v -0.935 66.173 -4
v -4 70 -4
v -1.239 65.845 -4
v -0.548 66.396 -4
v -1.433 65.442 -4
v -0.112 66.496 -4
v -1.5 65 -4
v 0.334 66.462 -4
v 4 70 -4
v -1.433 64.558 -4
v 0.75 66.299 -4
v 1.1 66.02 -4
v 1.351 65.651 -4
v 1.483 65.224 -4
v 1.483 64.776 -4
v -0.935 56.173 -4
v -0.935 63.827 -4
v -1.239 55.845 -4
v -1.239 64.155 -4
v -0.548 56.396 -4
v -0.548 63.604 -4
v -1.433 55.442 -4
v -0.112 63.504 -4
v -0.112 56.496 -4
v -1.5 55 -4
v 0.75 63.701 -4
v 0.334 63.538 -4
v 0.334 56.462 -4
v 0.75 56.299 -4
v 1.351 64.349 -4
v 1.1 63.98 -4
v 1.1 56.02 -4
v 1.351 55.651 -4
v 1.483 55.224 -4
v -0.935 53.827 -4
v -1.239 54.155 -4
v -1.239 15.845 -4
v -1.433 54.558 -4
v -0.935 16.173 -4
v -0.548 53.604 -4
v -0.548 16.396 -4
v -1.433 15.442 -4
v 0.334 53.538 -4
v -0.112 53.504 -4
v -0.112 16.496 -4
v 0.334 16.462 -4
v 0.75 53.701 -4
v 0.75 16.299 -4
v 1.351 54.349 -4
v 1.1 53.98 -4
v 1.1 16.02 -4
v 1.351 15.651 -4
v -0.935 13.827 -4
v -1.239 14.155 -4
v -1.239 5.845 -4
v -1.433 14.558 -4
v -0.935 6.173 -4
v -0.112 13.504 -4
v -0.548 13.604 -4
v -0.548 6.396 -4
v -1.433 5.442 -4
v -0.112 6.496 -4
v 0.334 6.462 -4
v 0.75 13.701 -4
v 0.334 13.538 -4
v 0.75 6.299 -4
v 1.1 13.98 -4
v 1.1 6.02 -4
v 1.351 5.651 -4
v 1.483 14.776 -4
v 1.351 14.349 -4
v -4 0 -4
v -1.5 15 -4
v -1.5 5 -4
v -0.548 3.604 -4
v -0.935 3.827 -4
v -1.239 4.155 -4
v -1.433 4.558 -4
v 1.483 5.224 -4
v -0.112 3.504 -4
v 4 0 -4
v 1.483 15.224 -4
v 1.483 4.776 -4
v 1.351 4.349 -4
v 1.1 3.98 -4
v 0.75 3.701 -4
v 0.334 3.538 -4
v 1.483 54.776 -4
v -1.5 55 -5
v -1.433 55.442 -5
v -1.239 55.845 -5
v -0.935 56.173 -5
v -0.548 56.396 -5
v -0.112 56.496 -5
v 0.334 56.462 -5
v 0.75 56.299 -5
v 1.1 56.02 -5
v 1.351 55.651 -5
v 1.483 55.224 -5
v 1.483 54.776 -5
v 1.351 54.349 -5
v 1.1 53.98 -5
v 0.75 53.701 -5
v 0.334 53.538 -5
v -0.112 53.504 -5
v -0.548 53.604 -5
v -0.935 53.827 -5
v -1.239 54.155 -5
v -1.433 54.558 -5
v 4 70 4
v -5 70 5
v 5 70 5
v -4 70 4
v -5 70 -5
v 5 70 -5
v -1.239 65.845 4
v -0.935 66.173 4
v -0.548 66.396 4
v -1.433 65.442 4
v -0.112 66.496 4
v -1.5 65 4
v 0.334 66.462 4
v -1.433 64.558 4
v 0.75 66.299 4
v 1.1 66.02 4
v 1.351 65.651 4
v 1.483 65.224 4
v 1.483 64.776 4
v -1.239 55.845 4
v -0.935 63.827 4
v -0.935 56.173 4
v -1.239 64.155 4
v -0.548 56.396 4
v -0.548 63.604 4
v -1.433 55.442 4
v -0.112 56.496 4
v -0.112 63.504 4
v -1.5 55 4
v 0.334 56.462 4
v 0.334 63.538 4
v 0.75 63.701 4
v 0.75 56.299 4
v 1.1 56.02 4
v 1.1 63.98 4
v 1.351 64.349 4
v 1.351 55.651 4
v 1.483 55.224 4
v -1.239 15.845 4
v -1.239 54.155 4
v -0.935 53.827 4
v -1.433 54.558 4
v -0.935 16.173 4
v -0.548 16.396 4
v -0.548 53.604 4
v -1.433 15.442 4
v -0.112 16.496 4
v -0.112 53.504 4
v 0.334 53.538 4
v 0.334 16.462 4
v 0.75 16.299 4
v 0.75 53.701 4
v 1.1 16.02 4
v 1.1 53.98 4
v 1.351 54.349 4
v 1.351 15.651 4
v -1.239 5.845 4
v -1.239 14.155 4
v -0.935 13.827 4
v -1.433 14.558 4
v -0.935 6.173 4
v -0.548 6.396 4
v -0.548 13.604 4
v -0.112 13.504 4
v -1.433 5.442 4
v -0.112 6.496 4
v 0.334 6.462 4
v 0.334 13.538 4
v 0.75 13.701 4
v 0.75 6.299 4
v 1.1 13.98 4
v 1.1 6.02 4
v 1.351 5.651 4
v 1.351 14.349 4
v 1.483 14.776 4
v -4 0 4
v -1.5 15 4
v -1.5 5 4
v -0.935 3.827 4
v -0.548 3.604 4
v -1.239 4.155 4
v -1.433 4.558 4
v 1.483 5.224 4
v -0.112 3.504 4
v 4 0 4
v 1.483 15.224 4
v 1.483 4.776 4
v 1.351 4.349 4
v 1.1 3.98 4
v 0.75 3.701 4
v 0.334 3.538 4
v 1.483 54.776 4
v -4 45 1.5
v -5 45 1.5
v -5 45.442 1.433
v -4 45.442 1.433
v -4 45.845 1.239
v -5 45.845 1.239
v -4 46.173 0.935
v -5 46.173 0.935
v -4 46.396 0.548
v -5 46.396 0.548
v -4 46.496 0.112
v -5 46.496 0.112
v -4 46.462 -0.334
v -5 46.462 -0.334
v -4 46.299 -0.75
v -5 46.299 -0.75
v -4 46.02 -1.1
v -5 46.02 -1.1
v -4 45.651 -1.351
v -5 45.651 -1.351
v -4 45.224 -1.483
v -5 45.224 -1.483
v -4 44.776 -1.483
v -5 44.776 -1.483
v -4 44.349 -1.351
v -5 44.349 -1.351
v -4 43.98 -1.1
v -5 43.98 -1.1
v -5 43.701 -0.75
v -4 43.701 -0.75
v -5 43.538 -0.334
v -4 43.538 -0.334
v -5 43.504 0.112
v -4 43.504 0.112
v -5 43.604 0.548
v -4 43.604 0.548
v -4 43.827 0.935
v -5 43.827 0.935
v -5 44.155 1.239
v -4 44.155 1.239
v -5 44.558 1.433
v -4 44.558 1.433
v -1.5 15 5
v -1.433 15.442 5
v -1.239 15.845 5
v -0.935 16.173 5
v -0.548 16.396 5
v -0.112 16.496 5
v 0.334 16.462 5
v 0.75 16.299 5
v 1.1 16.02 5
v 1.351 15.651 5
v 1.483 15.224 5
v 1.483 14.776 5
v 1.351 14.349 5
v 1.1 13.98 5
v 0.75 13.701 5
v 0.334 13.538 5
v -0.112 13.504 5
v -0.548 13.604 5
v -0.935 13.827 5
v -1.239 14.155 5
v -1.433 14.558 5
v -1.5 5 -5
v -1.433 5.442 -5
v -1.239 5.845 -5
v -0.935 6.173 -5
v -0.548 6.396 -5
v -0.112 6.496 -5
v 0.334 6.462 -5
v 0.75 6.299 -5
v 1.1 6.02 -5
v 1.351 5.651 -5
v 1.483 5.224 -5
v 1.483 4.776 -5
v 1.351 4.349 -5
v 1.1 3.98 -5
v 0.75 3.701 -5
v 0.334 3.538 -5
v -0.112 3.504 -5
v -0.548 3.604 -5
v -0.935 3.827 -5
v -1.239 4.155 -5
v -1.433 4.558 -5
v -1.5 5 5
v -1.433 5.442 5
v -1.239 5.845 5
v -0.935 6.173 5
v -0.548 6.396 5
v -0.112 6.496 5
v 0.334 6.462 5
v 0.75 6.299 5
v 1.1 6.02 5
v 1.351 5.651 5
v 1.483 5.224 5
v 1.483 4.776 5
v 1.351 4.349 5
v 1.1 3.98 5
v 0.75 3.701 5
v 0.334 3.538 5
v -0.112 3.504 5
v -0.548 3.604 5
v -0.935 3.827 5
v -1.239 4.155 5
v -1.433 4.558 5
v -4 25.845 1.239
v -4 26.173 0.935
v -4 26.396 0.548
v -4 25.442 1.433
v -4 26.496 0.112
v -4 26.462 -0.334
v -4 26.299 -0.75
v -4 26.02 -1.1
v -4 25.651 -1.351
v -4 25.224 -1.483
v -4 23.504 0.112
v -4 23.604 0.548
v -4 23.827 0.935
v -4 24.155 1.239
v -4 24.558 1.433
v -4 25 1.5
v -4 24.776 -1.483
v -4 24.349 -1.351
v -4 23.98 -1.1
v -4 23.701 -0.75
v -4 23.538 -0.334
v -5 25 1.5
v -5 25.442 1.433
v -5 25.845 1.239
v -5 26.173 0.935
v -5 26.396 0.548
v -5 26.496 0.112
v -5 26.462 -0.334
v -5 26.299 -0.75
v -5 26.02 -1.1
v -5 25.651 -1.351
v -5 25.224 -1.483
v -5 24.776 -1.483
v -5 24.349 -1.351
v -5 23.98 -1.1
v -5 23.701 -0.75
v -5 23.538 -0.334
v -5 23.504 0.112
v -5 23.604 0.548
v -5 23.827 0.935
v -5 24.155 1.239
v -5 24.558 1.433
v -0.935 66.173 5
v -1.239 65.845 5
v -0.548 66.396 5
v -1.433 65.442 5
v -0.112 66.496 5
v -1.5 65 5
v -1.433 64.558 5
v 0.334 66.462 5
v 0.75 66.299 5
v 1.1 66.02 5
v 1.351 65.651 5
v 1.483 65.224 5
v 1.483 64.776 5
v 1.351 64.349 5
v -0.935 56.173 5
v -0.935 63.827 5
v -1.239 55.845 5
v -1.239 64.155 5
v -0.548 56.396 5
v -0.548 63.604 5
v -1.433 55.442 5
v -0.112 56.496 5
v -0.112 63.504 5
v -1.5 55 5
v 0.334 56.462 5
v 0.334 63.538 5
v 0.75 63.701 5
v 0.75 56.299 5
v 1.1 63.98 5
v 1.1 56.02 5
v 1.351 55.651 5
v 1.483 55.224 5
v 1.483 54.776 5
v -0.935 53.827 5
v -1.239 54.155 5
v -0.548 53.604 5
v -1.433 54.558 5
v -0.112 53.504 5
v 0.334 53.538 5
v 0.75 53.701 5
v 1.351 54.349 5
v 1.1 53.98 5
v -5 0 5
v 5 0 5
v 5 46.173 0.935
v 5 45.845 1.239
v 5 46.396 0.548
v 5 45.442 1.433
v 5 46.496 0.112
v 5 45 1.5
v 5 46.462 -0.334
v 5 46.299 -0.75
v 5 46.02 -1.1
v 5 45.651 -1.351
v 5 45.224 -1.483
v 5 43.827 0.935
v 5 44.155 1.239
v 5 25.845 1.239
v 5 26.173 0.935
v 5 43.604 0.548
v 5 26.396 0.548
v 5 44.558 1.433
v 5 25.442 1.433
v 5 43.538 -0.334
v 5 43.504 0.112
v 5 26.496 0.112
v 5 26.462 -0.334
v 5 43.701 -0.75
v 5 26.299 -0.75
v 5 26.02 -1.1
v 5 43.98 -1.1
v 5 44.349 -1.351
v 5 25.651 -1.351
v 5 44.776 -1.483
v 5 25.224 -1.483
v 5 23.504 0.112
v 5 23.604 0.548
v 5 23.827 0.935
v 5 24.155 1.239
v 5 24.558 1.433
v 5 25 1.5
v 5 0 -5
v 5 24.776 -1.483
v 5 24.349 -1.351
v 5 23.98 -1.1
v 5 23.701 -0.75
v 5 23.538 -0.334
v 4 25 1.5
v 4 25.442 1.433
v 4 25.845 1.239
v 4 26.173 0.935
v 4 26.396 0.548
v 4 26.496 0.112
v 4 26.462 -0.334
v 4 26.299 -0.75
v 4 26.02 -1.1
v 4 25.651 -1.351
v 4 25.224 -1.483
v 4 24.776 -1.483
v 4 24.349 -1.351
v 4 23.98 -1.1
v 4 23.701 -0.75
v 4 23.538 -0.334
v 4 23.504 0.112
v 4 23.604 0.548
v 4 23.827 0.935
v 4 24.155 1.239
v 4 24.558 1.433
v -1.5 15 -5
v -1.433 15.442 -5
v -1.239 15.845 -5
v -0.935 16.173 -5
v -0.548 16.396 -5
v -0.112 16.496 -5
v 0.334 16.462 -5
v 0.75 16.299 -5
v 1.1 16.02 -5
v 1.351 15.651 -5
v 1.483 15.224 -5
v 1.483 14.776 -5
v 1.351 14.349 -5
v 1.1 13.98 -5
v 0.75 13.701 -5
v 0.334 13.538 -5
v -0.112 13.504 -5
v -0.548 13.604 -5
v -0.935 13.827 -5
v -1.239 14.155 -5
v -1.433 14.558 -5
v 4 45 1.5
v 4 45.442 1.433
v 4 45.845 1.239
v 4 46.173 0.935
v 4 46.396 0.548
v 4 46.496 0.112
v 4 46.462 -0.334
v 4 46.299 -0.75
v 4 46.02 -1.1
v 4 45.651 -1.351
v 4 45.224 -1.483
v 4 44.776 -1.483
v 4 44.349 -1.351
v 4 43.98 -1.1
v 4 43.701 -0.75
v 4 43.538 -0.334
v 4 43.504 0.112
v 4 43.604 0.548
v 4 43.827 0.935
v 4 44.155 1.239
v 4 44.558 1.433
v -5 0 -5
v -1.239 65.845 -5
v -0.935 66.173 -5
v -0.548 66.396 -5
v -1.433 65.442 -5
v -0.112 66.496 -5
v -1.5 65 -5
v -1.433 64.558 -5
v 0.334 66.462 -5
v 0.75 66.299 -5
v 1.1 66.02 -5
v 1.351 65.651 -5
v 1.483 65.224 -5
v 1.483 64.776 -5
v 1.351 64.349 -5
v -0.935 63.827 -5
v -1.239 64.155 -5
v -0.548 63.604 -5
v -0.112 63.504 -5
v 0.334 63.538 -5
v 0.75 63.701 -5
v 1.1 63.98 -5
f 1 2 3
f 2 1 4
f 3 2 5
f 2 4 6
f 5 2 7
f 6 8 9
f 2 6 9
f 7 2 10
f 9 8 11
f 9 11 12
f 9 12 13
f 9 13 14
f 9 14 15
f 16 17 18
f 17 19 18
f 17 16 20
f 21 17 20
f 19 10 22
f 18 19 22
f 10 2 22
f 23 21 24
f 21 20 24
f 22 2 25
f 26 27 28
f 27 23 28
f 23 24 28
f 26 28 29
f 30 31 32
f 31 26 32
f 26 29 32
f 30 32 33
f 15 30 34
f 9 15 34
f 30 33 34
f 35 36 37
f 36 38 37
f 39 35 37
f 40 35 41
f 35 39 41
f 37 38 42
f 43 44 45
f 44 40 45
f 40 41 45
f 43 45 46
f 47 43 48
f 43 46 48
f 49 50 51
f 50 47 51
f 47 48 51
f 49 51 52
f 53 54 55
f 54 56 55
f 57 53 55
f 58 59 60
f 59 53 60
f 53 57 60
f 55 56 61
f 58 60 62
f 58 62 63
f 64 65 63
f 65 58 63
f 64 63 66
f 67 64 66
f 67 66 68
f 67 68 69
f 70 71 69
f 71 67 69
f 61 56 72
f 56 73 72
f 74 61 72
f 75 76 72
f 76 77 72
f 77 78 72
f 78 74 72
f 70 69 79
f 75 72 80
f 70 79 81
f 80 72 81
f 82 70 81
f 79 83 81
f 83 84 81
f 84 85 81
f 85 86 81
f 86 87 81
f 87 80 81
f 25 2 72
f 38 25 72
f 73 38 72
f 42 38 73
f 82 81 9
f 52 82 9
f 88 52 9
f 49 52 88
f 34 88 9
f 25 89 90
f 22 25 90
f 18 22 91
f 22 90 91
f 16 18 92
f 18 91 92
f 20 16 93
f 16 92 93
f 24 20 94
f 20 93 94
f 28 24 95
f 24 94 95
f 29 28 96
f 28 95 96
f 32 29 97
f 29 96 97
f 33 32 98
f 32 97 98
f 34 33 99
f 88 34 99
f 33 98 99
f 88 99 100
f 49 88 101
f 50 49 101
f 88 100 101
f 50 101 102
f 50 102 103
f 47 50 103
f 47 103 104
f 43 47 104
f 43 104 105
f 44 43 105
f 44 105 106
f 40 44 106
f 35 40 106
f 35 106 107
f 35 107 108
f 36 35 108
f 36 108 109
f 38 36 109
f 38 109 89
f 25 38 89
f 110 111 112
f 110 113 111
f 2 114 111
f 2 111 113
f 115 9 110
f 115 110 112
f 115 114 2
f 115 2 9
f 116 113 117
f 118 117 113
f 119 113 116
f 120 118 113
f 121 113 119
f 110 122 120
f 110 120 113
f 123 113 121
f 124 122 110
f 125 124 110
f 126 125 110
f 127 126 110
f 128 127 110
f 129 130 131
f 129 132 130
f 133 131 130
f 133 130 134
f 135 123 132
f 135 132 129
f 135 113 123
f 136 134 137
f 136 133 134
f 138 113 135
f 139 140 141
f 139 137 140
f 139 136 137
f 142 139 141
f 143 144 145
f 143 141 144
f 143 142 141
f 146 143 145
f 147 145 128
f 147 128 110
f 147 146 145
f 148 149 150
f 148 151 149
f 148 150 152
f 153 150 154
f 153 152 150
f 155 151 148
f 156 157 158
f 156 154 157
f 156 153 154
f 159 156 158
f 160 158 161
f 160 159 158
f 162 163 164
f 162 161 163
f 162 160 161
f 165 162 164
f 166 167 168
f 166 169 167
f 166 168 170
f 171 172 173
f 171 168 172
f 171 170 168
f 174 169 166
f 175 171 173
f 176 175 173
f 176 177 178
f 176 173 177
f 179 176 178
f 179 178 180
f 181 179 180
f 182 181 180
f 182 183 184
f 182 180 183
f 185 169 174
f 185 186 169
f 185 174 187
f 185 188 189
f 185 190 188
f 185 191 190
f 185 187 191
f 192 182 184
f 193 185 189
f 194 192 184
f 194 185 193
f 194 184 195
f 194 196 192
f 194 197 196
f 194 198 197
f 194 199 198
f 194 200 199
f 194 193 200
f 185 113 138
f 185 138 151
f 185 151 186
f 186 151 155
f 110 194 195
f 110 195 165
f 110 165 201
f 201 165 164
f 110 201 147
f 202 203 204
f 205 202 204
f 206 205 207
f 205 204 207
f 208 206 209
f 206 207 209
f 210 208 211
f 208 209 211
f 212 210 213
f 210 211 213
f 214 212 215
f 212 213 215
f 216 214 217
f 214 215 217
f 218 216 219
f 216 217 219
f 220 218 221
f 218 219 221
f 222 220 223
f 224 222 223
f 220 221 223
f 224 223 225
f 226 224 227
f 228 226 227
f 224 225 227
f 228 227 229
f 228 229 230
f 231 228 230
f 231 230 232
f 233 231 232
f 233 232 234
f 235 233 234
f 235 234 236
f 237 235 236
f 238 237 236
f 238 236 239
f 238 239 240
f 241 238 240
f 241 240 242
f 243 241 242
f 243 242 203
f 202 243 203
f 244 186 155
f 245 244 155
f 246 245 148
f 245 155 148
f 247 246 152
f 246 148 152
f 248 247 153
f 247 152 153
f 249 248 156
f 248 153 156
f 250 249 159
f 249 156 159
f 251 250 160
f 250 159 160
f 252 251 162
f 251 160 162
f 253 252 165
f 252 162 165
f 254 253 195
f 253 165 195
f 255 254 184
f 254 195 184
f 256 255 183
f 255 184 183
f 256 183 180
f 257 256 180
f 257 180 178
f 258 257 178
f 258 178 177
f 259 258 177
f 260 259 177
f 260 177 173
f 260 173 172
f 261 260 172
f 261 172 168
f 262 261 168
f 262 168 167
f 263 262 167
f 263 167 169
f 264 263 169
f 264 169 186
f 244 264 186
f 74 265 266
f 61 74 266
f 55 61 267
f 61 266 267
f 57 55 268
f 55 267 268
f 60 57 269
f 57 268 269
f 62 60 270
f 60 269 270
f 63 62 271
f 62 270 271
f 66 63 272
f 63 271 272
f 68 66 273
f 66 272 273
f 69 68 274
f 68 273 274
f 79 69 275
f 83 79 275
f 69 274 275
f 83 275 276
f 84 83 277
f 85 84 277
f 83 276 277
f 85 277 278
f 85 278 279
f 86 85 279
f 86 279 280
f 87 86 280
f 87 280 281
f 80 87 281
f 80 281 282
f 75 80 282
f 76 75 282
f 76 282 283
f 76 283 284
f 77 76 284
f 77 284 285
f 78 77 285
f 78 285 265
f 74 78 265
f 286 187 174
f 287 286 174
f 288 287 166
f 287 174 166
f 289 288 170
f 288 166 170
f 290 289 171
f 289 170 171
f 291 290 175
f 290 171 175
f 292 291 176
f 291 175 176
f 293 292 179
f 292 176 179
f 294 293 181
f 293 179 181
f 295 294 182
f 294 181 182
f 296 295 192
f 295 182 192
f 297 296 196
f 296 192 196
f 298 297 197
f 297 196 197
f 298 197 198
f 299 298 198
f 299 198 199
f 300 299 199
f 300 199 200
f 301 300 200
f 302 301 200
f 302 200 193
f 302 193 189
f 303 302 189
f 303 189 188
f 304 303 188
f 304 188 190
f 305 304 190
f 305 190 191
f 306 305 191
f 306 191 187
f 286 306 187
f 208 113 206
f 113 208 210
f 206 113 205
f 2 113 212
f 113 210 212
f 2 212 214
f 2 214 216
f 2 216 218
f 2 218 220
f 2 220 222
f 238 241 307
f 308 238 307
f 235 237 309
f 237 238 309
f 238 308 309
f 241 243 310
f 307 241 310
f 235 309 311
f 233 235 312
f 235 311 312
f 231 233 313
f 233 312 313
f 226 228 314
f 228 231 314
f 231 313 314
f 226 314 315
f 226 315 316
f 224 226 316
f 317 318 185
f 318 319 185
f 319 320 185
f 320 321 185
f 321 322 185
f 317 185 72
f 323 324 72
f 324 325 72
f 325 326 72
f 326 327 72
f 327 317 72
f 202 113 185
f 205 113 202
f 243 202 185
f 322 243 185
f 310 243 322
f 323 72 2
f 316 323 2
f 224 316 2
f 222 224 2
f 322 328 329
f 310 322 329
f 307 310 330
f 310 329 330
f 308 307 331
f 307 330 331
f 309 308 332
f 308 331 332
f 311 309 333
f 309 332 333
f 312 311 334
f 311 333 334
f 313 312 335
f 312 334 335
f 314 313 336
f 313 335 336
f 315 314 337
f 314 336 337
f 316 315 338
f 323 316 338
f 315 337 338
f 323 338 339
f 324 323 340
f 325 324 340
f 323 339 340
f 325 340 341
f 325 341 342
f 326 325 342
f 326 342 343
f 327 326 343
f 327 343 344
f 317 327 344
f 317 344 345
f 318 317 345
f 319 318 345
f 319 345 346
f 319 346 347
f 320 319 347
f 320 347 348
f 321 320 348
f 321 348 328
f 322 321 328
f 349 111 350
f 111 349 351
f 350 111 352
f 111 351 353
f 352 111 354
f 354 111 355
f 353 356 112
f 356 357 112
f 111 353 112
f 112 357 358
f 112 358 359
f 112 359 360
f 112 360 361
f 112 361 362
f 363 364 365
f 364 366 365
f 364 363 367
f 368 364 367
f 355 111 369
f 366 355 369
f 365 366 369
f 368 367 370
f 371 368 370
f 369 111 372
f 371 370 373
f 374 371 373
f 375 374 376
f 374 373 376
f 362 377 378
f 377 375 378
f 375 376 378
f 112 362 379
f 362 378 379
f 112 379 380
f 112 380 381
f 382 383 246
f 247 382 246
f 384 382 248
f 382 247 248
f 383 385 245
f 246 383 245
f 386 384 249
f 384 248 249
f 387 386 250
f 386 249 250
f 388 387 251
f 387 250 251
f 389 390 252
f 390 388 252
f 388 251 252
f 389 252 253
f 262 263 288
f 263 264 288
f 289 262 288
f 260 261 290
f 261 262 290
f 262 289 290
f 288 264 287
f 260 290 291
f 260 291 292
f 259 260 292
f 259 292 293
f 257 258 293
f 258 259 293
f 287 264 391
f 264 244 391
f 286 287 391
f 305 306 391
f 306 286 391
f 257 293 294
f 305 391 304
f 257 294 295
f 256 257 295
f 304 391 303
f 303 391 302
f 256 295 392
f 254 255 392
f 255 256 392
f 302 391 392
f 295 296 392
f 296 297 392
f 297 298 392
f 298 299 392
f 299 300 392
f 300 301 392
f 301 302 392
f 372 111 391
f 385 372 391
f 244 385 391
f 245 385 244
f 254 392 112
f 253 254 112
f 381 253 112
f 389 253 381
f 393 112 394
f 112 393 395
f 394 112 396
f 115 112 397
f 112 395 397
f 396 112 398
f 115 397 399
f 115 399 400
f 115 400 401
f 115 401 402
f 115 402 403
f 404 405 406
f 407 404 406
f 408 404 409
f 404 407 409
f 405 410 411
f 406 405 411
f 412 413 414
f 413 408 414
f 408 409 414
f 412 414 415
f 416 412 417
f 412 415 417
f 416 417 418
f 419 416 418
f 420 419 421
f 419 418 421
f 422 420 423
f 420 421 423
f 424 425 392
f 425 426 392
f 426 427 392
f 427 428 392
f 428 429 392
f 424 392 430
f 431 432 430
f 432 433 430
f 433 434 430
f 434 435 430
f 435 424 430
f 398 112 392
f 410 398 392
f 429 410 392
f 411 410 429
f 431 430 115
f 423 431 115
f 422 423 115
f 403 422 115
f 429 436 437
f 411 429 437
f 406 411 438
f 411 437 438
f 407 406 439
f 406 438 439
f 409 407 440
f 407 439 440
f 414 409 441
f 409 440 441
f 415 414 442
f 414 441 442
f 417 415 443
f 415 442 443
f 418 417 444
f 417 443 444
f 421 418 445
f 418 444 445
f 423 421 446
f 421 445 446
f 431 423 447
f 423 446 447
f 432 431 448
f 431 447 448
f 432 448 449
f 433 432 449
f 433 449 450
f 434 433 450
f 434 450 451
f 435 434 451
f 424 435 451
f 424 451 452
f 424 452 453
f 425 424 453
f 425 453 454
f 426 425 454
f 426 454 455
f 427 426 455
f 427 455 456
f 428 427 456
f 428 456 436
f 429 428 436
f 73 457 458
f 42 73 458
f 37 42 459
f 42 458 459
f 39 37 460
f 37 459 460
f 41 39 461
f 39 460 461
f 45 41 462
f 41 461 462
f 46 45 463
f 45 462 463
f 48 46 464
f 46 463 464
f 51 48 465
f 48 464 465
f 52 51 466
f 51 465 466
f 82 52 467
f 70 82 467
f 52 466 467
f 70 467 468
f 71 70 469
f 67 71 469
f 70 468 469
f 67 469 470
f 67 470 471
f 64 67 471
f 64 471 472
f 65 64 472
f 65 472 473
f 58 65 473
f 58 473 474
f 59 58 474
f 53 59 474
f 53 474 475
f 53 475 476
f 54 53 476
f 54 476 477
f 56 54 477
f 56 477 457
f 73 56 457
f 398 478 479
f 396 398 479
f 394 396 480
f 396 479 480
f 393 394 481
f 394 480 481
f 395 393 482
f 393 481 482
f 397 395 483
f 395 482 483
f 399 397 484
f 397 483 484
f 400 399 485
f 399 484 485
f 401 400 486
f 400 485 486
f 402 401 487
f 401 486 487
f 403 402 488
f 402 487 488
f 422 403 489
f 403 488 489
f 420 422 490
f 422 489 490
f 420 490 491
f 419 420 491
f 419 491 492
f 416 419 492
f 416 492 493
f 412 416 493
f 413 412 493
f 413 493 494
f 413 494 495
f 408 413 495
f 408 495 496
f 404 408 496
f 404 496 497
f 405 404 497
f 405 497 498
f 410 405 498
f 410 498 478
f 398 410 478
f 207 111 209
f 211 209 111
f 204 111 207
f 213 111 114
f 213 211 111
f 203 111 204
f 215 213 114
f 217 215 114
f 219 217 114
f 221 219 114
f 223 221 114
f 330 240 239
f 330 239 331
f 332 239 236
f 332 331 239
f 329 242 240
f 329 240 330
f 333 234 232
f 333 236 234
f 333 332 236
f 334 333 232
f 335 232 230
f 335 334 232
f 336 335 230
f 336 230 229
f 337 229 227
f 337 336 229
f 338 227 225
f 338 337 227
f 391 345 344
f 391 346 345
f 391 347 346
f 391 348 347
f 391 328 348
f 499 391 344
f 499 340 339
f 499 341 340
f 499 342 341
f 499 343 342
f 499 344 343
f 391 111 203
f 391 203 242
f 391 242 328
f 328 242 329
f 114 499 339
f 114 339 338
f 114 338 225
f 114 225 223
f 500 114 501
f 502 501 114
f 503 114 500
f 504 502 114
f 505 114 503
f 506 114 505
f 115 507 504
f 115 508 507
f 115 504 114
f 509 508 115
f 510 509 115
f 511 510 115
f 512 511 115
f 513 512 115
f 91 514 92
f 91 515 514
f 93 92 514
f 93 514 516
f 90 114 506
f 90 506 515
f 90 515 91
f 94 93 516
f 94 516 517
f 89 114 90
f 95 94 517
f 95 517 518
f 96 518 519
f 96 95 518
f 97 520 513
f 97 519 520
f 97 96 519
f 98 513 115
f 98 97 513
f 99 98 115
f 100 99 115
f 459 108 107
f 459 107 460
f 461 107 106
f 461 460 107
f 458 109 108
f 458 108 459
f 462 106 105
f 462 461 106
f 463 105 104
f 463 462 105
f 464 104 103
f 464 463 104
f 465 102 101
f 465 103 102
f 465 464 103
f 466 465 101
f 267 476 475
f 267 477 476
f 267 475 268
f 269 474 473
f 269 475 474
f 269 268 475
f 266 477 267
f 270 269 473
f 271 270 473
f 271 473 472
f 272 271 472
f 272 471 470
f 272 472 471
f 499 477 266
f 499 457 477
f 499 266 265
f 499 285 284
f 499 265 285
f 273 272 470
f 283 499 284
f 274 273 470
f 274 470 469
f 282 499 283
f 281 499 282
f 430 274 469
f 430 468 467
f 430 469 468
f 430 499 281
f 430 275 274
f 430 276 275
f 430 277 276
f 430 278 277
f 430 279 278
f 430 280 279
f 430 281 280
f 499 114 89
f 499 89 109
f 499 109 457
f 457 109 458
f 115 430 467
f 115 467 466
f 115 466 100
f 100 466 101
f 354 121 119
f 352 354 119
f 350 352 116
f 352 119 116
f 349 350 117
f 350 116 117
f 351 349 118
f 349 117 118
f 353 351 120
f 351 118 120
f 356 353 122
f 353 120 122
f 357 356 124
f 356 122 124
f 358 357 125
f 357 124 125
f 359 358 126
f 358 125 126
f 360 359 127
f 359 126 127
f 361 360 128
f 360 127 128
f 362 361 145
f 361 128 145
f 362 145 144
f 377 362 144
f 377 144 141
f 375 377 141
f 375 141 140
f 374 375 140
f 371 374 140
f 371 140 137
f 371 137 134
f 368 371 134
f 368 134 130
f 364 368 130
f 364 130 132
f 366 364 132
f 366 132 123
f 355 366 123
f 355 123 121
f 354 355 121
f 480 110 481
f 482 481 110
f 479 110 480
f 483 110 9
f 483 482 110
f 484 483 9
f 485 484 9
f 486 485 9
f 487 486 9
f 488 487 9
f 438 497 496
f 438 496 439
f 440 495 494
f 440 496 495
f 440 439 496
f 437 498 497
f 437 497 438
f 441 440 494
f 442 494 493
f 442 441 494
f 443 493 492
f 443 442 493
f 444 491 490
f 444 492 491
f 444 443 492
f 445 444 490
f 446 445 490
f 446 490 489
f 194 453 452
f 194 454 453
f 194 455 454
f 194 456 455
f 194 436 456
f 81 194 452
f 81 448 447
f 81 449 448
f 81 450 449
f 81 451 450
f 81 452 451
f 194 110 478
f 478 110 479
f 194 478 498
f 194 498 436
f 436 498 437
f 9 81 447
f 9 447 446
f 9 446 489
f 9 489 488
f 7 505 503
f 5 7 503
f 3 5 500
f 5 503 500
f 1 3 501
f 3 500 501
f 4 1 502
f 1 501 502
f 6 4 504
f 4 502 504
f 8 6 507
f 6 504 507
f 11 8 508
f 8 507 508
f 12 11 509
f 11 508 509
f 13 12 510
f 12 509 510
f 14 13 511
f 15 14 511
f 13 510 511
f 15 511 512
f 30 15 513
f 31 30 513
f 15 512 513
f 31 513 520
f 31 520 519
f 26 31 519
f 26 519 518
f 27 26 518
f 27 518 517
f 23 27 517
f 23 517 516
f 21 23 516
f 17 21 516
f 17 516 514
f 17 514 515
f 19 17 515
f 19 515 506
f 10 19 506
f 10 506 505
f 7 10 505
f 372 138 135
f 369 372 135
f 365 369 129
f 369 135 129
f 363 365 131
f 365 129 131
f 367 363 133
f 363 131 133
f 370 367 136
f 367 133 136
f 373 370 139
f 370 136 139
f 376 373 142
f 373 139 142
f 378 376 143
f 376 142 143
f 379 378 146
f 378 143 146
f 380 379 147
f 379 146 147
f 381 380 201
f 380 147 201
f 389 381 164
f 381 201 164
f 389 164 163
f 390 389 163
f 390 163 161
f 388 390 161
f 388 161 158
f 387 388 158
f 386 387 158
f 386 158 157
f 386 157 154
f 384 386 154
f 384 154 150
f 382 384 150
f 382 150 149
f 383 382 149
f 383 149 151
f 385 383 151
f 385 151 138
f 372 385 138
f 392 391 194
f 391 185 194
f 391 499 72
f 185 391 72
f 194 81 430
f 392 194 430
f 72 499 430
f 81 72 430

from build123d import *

# Parameters (mm, degrees)
SKETCH_1_W          = 10
SKETCH_1_H          = 10
SKETCH_1_W_2        = 8
SKETCH_1_H_2        = 8
EXTRUDE_1_DEPTH     = 70
SKETCH_2_R          = 1.5
CUT_EXTRUDE_1_DEPTH = 30
SKETCH_3_R          = 1.5
CUT_EXTRUDE_2_DEPTH = 30


with BuildPart() as part:
    # 草图1 → 凸台-拉伸1 (new body)
    with BuildSketch(Plane(origin=(0, 0, 0), x_dir=(1, 0, 0), z_dir=(0, 1, 0))):
        Rectangle(SKETCH_1_W, SKETCH_1_H)
        Rectangle(SKETCH_1_W_2, SKETCH_1_H_2, mode=Mode.SUBTRACT)
    extrude(amount=EXTRUDE_1_DEPTH)

    # 草图2 → 切除-拉伸1 (cut)
    with BuildSketch(Plane.ZY.offset(5)):
        with Locations((0, 25)):
            Circle(SKETCH_2_R)
        with Locations((0, 45)):
            Circle(SKETCH_2_R)
    extrude(amount=-CUT_EXTRUDE_1_DEPTH, mode=Mode.SUBTRACT)

    # 草图3 → 切除-拉伸2 (cut)
    with BuildSketch(Plane(origin=(0, 0, -5), x_dir=(-1, 0, 0), z_dir=(0, 0, -1))):
        with Locations((0, 65)):
            Circle(SKETCH_3_R)
        with Locations((0, 55)):
            Circle(SKETCH_3_R)
        with Locations((0, 15)):
            Circle(SKETCH_3_R)
        with Locations((0, 5)):
            Circle(SKETCH_3_R)
    extrude(amount=-CUT_EXTRUDE_2_DEPTH, mode=Mode.SUBTRACT)


solid = part.part
